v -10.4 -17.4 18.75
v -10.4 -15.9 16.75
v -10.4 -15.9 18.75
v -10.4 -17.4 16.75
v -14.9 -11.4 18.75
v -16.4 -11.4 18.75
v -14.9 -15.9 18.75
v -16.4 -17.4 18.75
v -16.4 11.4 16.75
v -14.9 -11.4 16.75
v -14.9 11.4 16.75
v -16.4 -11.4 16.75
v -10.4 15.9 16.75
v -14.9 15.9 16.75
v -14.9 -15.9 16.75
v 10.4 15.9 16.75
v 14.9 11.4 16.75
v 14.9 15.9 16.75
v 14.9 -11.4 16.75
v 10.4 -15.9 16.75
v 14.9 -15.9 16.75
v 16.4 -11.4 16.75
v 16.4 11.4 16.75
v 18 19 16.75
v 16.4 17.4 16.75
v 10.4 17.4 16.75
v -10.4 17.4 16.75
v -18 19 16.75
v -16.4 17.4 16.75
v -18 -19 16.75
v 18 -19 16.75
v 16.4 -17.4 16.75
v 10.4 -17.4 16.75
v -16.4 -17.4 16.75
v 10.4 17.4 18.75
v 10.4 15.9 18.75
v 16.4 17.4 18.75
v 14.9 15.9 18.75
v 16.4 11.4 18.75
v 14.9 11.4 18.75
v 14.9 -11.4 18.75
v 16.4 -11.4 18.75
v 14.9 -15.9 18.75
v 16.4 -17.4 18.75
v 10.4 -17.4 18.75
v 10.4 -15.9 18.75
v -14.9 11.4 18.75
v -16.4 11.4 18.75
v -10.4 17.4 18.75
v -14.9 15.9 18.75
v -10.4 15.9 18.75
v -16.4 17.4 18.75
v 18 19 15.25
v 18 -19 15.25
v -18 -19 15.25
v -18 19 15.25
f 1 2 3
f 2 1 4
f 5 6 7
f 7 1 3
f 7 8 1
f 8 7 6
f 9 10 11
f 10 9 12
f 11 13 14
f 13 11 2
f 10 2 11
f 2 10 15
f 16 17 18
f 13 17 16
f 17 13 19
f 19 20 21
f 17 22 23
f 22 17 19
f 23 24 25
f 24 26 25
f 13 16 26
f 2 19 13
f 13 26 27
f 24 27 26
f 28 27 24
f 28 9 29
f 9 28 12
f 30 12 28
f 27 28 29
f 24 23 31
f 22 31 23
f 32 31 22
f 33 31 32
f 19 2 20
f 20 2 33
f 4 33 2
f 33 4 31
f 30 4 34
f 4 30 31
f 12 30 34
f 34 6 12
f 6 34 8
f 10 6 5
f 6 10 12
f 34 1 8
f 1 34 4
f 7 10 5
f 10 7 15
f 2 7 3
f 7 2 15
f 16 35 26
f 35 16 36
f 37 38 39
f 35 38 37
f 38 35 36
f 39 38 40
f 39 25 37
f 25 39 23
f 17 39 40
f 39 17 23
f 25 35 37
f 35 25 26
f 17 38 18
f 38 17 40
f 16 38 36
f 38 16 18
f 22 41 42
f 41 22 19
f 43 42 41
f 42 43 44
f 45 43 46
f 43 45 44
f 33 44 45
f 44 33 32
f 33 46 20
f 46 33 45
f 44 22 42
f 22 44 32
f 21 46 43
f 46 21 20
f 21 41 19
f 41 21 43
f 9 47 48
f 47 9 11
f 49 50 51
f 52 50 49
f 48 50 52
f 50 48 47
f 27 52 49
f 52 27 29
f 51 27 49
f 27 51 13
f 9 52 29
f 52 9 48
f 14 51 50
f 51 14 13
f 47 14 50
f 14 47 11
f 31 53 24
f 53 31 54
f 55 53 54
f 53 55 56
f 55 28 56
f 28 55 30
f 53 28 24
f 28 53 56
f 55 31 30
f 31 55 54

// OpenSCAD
shaft_cutout = 6.2 + 1.7;

Z_HEIGHT = 30;
X_HEIGHT = 36;
Y_HEIGHT = 38;
THICKNESS = 1.5 * 2;

USB_CUTOUT_Z = 20;
USB_CUTOUT_X = 17;
USB_CUTOUT_Y = 40;

TAB_SIZE = 6;
TAB_HEIGHT = 2;
TAB_TOLERANCE = 0.1;

USB_WALL_OFFSET = 1;

/*
difference(){
    cube([X_HEIGHT, Y_HEIGHT, Z_HEIGHT], center=true);
    translate([0,0,THICKNESS/2])
    cube([X_HEIGHT-THICKNESS, Y_HEIGHT-THICKNESS, Z_HEIGHT], center=true);
    
    translate([10,-3,0])
    rotate([0,90,0])
    cylinder(r=shaft_cutout/2, h=40, center=true, $fn=30);
    
    translate([X_HEIGHT/2 - USB_CUTOUT_X/2 - THICKNESS/2 - USB_WALL_OFFSET,20,0])
    cube([USB_CUTOUT_X, USB_CUTOUT_Y, USB_CUTOUT_Z], center=true);
}*/


/*
translate([7.5,20.5 - 3,0])
rotate([-90,0,-90])
import("4964 Rotary Trinkey.stl");
*/

module close_tab(){
    difference(){
        cube([TAB_SIZE,TAB_SIZE,TAB_HEIGHT], center=true);
        translate([1.5, 1.5, 0])
        cube([TAB_SIZE,TAB_SIZE,TAB_HEIGHT+1], center=true);
    }
}


module lid(){
    cube([X_HEIGHT, Y_HEIGHT, THICKNESS/2], center=true);
    
    translate([
        -X_HEIGHT/2 + 6/2 + THICKNESS/2 + TAB_TOLERANCE,
        -Y_HEIGHT/2 + 6/2 + THICKNESS/2 + TAB_TOLERANCE,
        THICKNESS/4 + 2/2
    ])
    close_tab();
    
    translate([
        X_HEIGHT/2 - 6/2 - THICKNESS/2 - TAB_TOLERANCE,
        Y_HEIGHT/2 - 6/2 - THICKNESS/2 - TAB_TOLERANCE,
        THICKNESS/4 + 2/2
    ])
    rotate([0,0,180])
    close_tab();
    
    translate([
        X_HEIGHT/2 - 6/2 - THICKNESS/2 - TAB_TOLERANCE,
        -Y_HEIGHT/2 + 6/2 + THICKNESS/2 + TAB_TOLERANCE,
        THICKNESS/4 + 2/2
    ])
    rotate([0,0,90])
    close_tab();
    
    translate([
        -X_HEIGHT/2 + 6/2 + THICKNESS/2 + TAB_TOLERANCE,
        Y_HEIGHT/2 - 6/2 - THICKNESS/2 - TAB_TOLERANCE,
        THICKNESS/4 + 2/2
    ])
    rotate([0,0,270])
    close_tab();
}

translate([0,0,16])
//rotate([0,180,0])
lid();

//translate([0, Y_HEIGHT/2-1, 10])
//cube([1,1,1], center=true);
